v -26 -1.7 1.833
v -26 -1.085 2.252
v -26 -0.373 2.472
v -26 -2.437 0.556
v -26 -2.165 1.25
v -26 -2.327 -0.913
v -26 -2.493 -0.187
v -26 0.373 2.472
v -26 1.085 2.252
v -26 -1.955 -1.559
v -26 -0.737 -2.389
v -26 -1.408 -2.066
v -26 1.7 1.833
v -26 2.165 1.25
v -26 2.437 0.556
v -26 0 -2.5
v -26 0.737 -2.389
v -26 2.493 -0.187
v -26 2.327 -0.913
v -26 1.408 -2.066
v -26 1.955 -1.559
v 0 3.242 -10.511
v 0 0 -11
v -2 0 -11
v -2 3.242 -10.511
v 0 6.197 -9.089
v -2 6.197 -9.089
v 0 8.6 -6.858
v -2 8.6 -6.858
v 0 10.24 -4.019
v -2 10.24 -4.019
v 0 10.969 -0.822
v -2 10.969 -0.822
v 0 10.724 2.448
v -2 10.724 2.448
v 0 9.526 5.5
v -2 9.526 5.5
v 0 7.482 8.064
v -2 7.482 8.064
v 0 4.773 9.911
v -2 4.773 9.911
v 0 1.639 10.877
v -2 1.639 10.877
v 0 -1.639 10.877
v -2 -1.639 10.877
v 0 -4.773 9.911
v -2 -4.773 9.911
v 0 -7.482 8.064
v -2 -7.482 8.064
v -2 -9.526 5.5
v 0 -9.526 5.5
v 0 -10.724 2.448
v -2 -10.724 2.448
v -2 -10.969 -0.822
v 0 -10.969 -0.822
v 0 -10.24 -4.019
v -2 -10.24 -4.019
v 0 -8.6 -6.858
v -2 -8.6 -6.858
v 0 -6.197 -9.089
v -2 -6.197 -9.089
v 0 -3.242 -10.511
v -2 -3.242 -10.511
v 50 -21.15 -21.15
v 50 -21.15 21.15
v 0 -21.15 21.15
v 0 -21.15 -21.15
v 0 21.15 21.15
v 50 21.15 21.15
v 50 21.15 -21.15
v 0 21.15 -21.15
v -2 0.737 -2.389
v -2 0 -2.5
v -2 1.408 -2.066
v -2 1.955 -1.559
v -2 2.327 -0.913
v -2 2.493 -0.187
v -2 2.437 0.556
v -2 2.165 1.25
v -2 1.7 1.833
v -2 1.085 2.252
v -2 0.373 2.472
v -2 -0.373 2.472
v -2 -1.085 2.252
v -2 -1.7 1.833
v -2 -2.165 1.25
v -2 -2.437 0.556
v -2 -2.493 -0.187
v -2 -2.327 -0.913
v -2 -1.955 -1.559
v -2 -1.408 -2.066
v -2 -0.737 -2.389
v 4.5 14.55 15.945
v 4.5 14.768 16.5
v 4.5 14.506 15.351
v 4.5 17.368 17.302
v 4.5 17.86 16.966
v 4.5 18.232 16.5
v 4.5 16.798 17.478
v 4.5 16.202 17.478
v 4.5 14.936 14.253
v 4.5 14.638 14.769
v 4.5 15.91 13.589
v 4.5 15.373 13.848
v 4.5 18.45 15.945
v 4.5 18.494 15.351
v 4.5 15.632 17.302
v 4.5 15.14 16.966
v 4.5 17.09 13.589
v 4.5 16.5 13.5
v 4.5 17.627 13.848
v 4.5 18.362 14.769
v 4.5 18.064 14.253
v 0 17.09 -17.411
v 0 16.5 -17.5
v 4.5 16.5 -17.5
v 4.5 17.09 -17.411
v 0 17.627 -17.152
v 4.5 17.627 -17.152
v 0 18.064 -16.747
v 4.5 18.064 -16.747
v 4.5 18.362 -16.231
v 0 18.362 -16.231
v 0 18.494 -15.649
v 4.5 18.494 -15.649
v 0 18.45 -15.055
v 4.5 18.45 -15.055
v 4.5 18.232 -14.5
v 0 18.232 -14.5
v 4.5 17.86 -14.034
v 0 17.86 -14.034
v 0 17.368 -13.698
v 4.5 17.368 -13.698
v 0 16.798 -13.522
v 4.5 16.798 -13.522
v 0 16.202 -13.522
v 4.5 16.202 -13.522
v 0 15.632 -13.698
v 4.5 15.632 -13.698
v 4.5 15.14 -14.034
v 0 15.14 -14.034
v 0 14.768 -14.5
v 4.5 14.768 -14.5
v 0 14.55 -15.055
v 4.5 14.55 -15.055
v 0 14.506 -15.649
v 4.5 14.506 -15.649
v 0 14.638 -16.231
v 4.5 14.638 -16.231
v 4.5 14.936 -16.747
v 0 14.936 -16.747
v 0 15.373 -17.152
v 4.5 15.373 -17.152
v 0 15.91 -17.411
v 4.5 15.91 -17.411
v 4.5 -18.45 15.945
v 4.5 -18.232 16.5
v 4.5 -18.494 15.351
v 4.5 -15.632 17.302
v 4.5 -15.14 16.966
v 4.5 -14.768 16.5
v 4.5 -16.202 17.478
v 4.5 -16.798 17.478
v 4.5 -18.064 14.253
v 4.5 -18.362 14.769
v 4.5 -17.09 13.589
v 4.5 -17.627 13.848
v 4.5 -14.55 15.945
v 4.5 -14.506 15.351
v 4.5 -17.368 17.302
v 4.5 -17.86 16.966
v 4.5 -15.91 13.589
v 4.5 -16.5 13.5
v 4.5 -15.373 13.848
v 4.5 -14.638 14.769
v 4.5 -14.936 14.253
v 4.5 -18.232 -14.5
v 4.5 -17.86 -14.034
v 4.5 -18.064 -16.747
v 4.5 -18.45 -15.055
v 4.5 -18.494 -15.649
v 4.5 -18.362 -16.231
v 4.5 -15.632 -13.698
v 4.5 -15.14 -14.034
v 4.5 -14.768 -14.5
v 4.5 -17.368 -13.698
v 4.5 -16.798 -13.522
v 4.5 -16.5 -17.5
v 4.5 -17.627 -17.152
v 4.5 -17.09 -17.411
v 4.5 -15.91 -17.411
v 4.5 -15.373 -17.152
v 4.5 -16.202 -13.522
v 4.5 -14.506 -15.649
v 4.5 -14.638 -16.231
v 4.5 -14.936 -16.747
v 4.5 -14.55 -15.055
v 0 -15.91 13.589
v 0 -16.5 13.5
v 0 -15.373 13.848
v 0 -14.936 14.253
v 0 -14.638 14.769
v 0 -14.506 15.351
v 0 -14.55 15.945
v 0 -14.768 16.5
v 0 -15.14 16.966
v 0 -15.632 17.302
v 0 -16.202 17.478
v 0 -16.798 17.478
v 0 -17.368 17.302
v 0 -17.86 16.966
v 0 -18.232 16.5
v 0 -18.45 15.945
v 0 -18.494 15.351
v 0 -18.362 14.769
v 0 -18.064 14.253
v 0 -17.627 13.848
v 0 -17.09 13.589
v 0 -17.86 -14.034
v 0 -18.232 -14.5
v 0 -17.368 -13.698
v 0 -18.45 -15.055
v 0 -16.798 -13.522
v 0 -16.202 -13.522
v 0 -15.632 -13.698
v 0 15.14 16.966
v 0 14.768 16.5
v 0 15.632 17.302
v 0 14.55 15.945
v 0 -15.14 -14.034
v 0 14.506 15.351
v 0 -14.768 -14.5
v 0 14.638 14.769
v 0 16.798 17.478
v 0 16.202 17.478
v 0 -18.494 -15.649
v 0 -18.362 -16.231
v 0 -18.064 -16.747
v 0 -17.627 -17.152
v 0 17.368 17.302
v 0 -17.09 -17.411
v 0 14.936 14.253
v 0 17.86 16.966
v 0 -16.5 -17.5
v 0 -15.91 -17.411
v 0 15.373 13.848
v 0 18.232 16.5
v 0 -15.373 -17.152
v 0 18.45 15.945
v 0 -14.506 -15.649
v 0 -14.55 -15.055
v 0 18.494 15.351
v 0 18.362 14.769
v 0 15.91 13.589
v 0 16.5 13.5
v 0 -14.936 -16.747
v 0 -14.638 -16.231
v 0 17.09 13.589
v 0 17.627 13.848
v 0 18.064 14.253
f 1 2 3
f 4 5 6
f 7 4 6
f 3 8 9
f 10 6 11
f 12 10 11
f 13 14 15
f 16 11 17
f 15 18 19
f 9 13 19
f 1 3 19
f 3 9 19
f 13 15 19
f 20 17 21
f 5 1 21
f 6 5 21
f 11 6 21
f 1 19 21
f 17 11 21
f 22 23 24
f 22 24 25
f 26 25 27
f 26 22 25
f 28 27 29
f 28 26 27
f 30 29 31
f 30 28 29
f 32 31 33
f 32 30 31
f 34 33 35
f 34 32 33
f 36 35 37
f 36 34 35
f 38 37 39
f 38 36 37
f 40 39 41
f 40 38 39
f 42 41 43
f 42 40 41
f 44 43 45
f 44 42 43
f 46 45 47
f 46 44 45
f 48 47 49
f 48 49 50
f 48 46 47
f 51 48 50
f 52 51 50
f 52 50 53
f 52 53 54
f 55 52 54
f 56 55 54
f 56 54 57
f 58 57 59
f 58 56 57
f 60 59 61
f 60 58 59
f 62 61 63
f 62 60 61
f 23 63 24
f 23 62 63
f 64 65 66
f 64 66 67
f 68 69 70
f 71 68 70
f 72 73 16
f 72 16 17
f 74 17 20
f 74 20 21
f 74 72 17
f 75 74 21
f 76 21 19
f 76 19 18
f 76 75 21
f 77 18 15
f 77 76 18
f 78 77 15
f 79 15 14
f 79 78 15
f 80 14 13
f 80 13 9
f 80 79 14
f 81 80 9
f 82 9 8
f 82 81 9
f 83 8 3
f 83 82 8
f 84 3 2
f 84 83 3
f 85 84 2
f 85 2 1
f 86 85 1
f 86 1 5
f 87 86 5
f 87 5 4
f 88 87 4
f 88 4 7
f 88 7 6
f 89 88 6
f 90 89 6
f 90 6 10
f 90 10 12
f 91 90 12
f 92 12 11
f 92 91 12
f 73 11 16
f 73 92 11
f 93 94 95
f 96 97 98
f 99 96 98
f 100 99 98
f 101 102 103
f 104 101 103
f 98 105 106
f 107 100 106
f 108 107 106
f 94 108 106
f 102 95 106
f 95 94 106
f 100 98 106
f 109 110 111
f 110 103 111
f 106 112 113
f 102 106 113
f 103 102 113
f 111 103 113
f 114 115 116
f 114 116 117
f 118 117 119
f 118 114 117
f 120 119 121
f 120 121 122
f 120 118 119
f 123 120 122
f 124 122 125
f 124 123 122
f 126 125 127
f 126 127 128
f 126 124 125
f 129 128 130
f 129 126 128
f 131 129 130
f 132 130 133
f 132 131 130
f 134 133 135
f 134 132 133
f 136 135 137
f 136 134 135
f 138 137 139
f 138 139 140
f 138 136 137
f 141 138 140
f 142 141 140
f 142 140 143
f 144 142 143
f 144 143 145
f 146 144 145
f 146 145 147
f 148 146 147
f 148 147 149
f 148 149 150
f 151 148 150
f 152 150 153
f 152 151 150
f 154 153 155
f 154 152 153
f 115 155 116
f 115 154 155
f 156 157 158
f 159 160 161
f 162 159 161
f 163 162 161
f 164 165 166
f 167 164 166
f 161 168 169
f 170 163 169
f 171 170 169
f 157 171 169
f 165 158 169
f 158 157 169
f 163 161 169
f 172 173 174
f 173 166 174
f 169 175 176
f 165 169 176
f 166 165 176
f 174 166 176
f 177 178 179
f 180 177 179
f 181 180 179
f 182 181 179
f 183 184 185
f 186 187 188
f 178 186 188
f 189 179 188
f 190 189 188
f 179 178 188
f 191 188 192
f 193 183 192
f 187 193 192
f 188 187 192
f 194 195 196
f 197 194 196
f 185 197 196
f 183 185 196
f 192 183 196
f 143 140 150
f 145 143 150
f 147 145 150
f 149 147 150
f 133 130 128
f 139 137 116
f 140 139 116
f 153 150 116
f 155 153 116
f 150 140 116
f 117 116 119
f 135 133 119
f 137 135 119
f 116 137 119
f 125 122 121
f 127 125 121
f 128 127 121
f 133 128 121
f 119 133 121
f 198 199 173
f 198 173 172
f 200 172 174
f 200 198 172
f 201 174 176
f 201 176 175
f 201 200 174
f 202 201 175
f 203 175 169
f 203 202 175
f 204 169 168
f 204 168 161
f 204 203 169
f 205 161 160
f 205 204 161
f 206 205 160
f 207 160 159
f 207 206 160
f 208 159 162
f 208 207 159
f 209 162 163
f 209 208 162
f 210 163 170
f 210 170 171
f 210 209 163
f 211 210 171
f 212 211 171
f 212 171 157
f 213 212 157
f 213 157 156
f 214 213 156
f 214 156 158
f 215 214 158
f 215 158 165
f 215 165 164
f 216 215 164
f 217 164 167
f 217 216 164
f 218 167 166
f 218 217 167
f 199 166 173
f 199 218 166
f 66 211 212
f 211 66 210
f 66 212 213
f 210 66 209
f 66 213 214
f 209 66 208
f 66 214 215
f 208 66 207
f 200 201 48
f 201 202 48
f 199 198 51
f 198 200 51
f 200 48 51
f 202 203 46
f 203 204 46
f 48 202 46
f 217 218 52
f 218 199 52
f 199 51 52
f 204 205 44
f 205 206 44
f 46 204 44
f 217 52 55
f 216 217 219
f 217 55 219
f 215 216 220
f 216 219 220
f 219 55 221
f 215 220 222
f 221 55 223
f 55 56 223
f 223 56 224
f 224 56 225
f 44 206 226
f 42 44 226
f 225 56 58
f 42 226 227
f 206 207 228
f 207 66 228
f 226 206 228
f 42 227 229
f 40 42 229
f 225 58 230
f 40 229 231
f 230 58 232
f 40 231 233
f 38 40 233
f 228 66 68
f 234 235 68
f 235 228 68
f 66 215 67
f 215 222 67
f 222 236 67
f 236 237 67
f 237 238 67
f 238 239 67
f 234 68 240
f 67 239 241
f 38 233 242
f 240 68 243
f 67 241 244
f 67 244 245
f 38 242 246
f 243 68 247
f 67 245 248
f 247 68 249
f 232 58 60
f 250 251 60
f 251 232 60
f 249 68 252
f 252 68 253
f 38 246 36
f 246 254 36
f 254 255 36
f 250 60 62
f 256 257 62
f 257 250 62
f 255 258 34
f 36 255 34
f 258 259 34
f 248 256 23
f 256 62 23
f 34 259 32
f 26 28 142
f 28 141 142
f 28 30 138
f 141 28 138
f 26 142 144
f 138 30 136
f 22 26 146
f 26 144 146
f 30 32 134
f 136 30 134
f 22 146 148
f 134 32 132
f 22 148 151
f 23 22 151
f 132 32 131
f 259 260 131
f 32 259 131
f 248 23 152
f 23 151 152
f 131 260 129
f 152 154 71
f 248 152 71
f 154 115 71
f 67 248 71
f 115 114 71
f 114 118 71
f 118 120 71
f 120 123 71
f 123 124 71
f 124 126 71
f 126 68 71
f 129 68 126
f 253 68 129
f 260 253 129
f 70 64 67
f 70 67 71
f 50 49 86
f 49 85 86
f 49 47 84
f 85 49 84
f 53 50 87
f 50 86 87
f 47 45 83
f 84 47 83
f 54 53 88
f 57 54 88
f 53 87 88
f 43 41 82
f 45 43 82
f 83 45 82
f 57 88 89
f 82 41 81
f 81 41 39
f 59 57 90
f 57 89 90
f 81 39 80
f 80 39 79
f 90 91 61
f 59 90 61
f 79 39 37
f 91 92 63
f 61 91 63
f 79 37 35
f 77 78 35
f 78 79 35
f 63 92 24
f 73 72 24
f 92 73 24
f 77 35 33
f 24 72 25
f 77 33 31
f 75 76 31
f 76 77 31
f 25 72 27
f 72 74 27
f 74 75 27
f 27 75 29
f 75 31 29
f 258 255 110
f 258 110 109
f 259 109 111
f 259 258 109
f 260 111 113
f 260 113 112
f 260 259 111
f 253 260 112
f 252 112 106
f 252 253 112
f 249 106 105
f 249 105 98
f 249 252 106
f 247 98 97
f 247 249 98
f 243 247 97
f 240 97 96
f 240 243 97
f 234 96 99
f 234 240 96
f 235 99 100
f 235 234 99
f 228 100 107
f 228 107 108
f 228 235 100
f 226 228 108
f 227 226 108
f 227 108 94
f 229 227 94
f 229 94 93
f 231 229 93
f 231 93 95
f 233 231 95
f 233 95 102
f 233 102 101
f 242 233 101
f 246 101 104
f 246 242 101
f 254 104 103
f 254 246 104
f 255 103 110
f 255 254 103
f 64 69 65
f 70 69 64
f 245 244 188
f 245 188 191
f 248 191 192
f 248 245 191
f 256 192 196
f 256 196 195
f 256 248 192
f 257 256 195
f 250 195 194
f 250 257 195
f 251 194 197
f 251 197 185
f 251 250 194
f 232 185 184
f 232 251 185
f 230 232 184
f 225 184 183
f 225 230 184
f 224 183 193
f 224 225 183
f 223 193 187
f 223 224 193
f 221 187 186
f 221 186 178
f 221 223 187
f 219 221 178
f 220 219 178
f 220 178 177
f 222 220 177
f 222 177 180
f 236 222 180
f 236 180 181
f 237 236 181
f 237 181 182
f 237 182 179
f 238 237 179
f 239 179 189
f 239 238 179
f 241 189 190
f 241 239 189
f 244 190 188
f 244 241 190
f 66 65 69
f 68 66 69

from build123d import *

# Parameters (mm, degrees)
SKETCH1_W           = 42.3
SKETCH1_H           = 42.3
BOSS_EXTRUDE1_DEPTH = 50
SKETCH2_R           = 11
BOSS_EXTRUDE2_DEPTH = 2
BOSS_EXTRUDE3_START = -2
SKETCH3_R           = 2.5
BOSS_EXTRUDE3_DEPTH = 24
SKETCH4_R           = 2
CUT_EXTRUDE1_DEPTH  = 4.5


with BuildPart() as part:
    # Sketch1 → Boss-Extrude1 (new body)
    with BuildSketch(Plane(origin=(0, 0, 0), x_dir=(0, 0, -1), z_dir=(1, 0, 0))):
        Rectangle(SKETCH1_W, SKETCH1_H)
    extrude(amount=BOSS_EXTRUDE1_DEPTH)

    # Sketch2 → Boss-Extrude2 (add)
    with BuildSketch(Plane(origin=(0, 0, 0), x_dir=(0, 0, -1), z_dir=(1, 0, 0))):
        Circle(SKETCH2_R)
    extrude(amount=-BOSS_EXTRUDE2_DEPTH)

    # Sketch3 → Boss-Extrude3 (add)
    with BuildSketch(Plane(origin=(0, 0, 0), x_dir=(0, 0, -1), z_dir=(1, 0, 0)).offset(BOSS_EXTRUDE3_START)):
        Circle(SKETCH3_R)
    extrude(amount=-BOSS_EXTRUDE3_DEPTH)

    # Sketch4 → Cut-Extrude1 (cut)
    with BuildSketch(Plane(origin=(0, 0, 0), x_dir=(0, 0, -1), z_dir=(1, 0, 0))):
        with Locations((15.5, 16.5)):
            Circle(SKETCH4_R)
        with Locations((15.5, -16.5)):
            Circle(SKETCH4_R)
        with Locations((-15.5, -16.5)):
            Circle(SKETCH4_R)
        with Locations((-15.5, 16.5)):
            Circle(SKETCH4_R)
    extrude(amount=CUT_EXTRUDE1_DEPTH, mode=Mode.SUBTRACT)


solid = part.part
